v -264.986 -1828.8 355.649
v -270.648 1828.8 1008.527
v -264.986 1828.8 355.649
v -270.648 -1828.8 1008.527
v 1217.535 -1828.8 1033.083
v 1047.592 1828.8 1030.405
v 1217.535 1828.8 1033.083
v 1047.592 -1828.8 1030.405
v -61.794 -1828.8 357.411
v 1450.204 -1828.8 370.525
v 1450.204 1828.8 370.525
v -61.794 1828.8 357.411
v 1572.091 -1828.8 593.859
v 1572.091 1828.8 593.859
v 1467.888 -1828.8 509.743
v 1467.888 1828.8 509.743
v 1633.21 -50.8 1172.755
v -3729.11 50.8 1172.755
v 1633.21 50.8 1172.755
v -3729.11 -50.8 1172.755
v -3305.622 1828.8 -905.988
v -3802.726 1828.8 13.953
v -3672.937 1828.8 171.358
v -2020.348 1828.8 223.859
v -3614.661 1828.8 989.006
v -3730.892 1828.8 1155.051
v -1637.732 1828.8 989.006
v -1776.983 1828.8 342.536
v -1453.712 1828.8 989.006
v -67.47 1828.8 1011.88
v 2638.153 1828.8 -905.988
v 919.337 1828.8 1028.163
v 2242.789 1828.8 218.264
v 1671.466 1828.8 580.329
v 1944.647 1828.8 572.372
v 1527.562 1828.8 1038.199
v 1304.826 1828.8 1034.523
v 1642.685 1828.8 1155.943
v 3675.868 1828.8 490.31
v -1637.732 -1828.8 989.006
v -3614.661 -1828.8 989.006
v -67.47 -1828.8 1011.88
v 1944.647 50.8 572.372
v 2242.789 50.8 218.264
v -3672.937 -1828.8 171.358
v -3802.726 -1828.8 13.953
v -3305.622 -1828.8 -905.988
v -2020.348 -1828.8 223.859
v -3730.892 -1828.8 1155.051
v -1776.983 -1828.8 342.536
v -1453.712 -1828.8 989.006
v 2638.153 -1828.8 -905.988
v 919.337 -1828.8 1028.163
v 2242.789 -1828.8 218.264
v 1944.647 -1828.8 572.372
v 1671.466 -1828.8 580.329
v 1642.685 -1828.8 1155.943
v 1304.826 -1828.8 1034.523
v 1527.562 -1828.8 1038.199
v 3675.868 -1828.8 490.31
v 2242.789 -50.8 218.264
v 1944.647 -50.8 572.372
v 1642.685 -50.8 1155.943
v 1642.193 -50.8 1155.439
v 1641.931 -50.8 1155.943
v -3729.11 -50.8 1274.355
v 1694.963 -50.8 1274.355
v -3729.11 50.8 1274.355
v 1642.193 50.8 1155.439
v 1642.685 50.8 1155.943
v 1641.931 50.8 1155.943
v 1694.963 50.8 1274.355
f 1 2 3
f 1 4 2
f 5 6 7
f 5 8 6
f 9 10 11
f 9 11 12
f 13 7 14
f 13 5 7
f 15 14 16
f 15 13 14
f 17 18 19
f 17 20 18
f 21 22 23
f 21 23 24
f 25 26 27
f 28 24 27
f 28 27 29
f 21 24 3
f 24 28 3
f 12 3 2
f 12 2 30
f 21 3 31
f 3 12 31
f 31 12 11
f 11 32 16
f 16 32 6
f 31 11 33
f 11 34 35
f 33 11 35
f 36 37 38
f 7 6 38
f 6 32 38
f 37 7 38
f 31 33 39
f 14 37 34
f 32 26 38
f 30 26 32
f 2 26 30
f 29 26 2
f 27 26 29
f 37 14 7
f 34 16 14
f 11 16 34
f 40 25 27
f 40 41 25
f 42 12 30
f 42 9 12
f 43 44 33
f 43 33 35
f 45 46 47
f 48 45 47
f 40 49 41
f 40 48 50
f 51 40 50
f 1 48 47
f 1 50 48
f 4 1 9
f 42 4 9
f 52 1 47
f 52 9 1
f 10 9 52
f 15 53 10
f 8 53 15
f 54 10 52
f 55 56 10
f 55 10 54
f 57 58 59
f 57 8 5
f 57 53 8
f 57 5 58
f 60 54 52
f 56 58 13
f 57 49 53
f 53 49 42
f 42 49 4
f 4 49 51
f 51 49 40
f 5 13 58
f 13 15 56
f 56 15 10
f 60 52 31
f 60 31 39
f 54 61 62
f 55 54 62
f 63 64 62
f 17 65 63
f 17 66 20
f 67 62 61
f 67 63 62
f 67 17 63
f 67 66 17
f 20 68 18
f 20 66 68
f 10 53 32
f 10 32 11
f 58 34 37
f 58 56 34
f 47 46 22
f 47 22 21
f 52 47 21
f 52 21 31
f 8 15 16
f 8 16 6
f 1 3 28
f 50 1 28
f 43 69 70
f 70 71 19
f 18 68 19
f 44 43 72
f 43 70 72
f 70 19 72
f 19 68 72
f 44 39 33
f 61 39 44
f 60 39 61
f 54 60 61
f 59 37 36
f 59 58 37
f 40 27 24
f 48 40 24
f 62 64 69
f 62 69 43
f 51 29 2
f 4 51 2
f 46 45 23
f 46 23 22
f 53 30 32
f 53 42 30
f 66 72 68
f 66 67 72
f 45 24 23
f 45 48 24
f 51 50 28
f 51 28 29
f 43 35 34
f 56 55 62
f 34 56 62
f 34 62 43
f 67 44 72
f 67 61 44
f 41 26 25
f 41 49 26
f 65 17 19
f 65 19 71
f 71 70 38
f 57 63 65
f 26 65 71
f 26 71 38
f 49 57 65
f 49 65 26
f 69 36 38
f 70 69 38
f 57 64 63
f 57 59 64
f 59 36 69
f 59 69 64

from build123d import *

# Parameters (mm, degrees)
F1_DEPTH      = 1828.8
F3_DEPTH      = 50.8
F3_DEPTH_BACK = 50.8


with BuildPart() as f1:
    # F0 (on Front) → F1 (new body, symmetric)
    with BuildSketch(Plane.XZ):
        Polygon((-2020.348307, 223.85879), (-3672.937155, 171.358168), (-3802.726367, 13.953226), (-3305.621624, -905.987799), (2638.152599, -905.987799), (3675.868273, 490.310133), (2242.78903, 218.264133), (1944.646955, 572.371602), (1671.465755, 580.329478), (1304.825534, 1034.523337), (1527.562499, 1038.1986), (1642.685175, 1155.942798), (-3730.89198, 1155.050703), (-3614.660896, 989.006193), (-1637.731874, 989.006193), align=None)
        Polygon((-264.985985, 355.649034), (-1776.98334, 342.535501), (-1453.71189, 989.006193), (-270.64839, 1008.527288), align=None, mode=Mode.SUBTRACT)
        Polygon((919.336913, 1028.162596), (1450.203727, 370.524853), (-61.793627, 357.411319), (-67.469824, 1011.879829), align=None, mode=Mode.SUBTRACT)
        Polygon((1467.888093, 509.742774), (1047.592423, 1030.404998), (1217.534915, 1033.083001), (1572.091088, 593.858859), align=None, mode=Mode.SUBTRACT)
    extrude(amount=F1_DEPTH, both=True)

    # F2 (on Front) → F3 (join, two sides)
    with BuildSketch(Plane.XZ) as f3_sk:
        Polygon((1633.210299, 1172.754667), (1944.646955, 572.371602), (2242.78903, 218.264133), (1694.963279, 1274.354667), (-3729.110487, 1274.354667), (-3729.110487, 1172.754667), align=None)
    extrude(amount=F3_DEPTH)
    extrude(f3_sk.sketch, amount=-F3_DEPTH_BACK)


solid = f1.part
